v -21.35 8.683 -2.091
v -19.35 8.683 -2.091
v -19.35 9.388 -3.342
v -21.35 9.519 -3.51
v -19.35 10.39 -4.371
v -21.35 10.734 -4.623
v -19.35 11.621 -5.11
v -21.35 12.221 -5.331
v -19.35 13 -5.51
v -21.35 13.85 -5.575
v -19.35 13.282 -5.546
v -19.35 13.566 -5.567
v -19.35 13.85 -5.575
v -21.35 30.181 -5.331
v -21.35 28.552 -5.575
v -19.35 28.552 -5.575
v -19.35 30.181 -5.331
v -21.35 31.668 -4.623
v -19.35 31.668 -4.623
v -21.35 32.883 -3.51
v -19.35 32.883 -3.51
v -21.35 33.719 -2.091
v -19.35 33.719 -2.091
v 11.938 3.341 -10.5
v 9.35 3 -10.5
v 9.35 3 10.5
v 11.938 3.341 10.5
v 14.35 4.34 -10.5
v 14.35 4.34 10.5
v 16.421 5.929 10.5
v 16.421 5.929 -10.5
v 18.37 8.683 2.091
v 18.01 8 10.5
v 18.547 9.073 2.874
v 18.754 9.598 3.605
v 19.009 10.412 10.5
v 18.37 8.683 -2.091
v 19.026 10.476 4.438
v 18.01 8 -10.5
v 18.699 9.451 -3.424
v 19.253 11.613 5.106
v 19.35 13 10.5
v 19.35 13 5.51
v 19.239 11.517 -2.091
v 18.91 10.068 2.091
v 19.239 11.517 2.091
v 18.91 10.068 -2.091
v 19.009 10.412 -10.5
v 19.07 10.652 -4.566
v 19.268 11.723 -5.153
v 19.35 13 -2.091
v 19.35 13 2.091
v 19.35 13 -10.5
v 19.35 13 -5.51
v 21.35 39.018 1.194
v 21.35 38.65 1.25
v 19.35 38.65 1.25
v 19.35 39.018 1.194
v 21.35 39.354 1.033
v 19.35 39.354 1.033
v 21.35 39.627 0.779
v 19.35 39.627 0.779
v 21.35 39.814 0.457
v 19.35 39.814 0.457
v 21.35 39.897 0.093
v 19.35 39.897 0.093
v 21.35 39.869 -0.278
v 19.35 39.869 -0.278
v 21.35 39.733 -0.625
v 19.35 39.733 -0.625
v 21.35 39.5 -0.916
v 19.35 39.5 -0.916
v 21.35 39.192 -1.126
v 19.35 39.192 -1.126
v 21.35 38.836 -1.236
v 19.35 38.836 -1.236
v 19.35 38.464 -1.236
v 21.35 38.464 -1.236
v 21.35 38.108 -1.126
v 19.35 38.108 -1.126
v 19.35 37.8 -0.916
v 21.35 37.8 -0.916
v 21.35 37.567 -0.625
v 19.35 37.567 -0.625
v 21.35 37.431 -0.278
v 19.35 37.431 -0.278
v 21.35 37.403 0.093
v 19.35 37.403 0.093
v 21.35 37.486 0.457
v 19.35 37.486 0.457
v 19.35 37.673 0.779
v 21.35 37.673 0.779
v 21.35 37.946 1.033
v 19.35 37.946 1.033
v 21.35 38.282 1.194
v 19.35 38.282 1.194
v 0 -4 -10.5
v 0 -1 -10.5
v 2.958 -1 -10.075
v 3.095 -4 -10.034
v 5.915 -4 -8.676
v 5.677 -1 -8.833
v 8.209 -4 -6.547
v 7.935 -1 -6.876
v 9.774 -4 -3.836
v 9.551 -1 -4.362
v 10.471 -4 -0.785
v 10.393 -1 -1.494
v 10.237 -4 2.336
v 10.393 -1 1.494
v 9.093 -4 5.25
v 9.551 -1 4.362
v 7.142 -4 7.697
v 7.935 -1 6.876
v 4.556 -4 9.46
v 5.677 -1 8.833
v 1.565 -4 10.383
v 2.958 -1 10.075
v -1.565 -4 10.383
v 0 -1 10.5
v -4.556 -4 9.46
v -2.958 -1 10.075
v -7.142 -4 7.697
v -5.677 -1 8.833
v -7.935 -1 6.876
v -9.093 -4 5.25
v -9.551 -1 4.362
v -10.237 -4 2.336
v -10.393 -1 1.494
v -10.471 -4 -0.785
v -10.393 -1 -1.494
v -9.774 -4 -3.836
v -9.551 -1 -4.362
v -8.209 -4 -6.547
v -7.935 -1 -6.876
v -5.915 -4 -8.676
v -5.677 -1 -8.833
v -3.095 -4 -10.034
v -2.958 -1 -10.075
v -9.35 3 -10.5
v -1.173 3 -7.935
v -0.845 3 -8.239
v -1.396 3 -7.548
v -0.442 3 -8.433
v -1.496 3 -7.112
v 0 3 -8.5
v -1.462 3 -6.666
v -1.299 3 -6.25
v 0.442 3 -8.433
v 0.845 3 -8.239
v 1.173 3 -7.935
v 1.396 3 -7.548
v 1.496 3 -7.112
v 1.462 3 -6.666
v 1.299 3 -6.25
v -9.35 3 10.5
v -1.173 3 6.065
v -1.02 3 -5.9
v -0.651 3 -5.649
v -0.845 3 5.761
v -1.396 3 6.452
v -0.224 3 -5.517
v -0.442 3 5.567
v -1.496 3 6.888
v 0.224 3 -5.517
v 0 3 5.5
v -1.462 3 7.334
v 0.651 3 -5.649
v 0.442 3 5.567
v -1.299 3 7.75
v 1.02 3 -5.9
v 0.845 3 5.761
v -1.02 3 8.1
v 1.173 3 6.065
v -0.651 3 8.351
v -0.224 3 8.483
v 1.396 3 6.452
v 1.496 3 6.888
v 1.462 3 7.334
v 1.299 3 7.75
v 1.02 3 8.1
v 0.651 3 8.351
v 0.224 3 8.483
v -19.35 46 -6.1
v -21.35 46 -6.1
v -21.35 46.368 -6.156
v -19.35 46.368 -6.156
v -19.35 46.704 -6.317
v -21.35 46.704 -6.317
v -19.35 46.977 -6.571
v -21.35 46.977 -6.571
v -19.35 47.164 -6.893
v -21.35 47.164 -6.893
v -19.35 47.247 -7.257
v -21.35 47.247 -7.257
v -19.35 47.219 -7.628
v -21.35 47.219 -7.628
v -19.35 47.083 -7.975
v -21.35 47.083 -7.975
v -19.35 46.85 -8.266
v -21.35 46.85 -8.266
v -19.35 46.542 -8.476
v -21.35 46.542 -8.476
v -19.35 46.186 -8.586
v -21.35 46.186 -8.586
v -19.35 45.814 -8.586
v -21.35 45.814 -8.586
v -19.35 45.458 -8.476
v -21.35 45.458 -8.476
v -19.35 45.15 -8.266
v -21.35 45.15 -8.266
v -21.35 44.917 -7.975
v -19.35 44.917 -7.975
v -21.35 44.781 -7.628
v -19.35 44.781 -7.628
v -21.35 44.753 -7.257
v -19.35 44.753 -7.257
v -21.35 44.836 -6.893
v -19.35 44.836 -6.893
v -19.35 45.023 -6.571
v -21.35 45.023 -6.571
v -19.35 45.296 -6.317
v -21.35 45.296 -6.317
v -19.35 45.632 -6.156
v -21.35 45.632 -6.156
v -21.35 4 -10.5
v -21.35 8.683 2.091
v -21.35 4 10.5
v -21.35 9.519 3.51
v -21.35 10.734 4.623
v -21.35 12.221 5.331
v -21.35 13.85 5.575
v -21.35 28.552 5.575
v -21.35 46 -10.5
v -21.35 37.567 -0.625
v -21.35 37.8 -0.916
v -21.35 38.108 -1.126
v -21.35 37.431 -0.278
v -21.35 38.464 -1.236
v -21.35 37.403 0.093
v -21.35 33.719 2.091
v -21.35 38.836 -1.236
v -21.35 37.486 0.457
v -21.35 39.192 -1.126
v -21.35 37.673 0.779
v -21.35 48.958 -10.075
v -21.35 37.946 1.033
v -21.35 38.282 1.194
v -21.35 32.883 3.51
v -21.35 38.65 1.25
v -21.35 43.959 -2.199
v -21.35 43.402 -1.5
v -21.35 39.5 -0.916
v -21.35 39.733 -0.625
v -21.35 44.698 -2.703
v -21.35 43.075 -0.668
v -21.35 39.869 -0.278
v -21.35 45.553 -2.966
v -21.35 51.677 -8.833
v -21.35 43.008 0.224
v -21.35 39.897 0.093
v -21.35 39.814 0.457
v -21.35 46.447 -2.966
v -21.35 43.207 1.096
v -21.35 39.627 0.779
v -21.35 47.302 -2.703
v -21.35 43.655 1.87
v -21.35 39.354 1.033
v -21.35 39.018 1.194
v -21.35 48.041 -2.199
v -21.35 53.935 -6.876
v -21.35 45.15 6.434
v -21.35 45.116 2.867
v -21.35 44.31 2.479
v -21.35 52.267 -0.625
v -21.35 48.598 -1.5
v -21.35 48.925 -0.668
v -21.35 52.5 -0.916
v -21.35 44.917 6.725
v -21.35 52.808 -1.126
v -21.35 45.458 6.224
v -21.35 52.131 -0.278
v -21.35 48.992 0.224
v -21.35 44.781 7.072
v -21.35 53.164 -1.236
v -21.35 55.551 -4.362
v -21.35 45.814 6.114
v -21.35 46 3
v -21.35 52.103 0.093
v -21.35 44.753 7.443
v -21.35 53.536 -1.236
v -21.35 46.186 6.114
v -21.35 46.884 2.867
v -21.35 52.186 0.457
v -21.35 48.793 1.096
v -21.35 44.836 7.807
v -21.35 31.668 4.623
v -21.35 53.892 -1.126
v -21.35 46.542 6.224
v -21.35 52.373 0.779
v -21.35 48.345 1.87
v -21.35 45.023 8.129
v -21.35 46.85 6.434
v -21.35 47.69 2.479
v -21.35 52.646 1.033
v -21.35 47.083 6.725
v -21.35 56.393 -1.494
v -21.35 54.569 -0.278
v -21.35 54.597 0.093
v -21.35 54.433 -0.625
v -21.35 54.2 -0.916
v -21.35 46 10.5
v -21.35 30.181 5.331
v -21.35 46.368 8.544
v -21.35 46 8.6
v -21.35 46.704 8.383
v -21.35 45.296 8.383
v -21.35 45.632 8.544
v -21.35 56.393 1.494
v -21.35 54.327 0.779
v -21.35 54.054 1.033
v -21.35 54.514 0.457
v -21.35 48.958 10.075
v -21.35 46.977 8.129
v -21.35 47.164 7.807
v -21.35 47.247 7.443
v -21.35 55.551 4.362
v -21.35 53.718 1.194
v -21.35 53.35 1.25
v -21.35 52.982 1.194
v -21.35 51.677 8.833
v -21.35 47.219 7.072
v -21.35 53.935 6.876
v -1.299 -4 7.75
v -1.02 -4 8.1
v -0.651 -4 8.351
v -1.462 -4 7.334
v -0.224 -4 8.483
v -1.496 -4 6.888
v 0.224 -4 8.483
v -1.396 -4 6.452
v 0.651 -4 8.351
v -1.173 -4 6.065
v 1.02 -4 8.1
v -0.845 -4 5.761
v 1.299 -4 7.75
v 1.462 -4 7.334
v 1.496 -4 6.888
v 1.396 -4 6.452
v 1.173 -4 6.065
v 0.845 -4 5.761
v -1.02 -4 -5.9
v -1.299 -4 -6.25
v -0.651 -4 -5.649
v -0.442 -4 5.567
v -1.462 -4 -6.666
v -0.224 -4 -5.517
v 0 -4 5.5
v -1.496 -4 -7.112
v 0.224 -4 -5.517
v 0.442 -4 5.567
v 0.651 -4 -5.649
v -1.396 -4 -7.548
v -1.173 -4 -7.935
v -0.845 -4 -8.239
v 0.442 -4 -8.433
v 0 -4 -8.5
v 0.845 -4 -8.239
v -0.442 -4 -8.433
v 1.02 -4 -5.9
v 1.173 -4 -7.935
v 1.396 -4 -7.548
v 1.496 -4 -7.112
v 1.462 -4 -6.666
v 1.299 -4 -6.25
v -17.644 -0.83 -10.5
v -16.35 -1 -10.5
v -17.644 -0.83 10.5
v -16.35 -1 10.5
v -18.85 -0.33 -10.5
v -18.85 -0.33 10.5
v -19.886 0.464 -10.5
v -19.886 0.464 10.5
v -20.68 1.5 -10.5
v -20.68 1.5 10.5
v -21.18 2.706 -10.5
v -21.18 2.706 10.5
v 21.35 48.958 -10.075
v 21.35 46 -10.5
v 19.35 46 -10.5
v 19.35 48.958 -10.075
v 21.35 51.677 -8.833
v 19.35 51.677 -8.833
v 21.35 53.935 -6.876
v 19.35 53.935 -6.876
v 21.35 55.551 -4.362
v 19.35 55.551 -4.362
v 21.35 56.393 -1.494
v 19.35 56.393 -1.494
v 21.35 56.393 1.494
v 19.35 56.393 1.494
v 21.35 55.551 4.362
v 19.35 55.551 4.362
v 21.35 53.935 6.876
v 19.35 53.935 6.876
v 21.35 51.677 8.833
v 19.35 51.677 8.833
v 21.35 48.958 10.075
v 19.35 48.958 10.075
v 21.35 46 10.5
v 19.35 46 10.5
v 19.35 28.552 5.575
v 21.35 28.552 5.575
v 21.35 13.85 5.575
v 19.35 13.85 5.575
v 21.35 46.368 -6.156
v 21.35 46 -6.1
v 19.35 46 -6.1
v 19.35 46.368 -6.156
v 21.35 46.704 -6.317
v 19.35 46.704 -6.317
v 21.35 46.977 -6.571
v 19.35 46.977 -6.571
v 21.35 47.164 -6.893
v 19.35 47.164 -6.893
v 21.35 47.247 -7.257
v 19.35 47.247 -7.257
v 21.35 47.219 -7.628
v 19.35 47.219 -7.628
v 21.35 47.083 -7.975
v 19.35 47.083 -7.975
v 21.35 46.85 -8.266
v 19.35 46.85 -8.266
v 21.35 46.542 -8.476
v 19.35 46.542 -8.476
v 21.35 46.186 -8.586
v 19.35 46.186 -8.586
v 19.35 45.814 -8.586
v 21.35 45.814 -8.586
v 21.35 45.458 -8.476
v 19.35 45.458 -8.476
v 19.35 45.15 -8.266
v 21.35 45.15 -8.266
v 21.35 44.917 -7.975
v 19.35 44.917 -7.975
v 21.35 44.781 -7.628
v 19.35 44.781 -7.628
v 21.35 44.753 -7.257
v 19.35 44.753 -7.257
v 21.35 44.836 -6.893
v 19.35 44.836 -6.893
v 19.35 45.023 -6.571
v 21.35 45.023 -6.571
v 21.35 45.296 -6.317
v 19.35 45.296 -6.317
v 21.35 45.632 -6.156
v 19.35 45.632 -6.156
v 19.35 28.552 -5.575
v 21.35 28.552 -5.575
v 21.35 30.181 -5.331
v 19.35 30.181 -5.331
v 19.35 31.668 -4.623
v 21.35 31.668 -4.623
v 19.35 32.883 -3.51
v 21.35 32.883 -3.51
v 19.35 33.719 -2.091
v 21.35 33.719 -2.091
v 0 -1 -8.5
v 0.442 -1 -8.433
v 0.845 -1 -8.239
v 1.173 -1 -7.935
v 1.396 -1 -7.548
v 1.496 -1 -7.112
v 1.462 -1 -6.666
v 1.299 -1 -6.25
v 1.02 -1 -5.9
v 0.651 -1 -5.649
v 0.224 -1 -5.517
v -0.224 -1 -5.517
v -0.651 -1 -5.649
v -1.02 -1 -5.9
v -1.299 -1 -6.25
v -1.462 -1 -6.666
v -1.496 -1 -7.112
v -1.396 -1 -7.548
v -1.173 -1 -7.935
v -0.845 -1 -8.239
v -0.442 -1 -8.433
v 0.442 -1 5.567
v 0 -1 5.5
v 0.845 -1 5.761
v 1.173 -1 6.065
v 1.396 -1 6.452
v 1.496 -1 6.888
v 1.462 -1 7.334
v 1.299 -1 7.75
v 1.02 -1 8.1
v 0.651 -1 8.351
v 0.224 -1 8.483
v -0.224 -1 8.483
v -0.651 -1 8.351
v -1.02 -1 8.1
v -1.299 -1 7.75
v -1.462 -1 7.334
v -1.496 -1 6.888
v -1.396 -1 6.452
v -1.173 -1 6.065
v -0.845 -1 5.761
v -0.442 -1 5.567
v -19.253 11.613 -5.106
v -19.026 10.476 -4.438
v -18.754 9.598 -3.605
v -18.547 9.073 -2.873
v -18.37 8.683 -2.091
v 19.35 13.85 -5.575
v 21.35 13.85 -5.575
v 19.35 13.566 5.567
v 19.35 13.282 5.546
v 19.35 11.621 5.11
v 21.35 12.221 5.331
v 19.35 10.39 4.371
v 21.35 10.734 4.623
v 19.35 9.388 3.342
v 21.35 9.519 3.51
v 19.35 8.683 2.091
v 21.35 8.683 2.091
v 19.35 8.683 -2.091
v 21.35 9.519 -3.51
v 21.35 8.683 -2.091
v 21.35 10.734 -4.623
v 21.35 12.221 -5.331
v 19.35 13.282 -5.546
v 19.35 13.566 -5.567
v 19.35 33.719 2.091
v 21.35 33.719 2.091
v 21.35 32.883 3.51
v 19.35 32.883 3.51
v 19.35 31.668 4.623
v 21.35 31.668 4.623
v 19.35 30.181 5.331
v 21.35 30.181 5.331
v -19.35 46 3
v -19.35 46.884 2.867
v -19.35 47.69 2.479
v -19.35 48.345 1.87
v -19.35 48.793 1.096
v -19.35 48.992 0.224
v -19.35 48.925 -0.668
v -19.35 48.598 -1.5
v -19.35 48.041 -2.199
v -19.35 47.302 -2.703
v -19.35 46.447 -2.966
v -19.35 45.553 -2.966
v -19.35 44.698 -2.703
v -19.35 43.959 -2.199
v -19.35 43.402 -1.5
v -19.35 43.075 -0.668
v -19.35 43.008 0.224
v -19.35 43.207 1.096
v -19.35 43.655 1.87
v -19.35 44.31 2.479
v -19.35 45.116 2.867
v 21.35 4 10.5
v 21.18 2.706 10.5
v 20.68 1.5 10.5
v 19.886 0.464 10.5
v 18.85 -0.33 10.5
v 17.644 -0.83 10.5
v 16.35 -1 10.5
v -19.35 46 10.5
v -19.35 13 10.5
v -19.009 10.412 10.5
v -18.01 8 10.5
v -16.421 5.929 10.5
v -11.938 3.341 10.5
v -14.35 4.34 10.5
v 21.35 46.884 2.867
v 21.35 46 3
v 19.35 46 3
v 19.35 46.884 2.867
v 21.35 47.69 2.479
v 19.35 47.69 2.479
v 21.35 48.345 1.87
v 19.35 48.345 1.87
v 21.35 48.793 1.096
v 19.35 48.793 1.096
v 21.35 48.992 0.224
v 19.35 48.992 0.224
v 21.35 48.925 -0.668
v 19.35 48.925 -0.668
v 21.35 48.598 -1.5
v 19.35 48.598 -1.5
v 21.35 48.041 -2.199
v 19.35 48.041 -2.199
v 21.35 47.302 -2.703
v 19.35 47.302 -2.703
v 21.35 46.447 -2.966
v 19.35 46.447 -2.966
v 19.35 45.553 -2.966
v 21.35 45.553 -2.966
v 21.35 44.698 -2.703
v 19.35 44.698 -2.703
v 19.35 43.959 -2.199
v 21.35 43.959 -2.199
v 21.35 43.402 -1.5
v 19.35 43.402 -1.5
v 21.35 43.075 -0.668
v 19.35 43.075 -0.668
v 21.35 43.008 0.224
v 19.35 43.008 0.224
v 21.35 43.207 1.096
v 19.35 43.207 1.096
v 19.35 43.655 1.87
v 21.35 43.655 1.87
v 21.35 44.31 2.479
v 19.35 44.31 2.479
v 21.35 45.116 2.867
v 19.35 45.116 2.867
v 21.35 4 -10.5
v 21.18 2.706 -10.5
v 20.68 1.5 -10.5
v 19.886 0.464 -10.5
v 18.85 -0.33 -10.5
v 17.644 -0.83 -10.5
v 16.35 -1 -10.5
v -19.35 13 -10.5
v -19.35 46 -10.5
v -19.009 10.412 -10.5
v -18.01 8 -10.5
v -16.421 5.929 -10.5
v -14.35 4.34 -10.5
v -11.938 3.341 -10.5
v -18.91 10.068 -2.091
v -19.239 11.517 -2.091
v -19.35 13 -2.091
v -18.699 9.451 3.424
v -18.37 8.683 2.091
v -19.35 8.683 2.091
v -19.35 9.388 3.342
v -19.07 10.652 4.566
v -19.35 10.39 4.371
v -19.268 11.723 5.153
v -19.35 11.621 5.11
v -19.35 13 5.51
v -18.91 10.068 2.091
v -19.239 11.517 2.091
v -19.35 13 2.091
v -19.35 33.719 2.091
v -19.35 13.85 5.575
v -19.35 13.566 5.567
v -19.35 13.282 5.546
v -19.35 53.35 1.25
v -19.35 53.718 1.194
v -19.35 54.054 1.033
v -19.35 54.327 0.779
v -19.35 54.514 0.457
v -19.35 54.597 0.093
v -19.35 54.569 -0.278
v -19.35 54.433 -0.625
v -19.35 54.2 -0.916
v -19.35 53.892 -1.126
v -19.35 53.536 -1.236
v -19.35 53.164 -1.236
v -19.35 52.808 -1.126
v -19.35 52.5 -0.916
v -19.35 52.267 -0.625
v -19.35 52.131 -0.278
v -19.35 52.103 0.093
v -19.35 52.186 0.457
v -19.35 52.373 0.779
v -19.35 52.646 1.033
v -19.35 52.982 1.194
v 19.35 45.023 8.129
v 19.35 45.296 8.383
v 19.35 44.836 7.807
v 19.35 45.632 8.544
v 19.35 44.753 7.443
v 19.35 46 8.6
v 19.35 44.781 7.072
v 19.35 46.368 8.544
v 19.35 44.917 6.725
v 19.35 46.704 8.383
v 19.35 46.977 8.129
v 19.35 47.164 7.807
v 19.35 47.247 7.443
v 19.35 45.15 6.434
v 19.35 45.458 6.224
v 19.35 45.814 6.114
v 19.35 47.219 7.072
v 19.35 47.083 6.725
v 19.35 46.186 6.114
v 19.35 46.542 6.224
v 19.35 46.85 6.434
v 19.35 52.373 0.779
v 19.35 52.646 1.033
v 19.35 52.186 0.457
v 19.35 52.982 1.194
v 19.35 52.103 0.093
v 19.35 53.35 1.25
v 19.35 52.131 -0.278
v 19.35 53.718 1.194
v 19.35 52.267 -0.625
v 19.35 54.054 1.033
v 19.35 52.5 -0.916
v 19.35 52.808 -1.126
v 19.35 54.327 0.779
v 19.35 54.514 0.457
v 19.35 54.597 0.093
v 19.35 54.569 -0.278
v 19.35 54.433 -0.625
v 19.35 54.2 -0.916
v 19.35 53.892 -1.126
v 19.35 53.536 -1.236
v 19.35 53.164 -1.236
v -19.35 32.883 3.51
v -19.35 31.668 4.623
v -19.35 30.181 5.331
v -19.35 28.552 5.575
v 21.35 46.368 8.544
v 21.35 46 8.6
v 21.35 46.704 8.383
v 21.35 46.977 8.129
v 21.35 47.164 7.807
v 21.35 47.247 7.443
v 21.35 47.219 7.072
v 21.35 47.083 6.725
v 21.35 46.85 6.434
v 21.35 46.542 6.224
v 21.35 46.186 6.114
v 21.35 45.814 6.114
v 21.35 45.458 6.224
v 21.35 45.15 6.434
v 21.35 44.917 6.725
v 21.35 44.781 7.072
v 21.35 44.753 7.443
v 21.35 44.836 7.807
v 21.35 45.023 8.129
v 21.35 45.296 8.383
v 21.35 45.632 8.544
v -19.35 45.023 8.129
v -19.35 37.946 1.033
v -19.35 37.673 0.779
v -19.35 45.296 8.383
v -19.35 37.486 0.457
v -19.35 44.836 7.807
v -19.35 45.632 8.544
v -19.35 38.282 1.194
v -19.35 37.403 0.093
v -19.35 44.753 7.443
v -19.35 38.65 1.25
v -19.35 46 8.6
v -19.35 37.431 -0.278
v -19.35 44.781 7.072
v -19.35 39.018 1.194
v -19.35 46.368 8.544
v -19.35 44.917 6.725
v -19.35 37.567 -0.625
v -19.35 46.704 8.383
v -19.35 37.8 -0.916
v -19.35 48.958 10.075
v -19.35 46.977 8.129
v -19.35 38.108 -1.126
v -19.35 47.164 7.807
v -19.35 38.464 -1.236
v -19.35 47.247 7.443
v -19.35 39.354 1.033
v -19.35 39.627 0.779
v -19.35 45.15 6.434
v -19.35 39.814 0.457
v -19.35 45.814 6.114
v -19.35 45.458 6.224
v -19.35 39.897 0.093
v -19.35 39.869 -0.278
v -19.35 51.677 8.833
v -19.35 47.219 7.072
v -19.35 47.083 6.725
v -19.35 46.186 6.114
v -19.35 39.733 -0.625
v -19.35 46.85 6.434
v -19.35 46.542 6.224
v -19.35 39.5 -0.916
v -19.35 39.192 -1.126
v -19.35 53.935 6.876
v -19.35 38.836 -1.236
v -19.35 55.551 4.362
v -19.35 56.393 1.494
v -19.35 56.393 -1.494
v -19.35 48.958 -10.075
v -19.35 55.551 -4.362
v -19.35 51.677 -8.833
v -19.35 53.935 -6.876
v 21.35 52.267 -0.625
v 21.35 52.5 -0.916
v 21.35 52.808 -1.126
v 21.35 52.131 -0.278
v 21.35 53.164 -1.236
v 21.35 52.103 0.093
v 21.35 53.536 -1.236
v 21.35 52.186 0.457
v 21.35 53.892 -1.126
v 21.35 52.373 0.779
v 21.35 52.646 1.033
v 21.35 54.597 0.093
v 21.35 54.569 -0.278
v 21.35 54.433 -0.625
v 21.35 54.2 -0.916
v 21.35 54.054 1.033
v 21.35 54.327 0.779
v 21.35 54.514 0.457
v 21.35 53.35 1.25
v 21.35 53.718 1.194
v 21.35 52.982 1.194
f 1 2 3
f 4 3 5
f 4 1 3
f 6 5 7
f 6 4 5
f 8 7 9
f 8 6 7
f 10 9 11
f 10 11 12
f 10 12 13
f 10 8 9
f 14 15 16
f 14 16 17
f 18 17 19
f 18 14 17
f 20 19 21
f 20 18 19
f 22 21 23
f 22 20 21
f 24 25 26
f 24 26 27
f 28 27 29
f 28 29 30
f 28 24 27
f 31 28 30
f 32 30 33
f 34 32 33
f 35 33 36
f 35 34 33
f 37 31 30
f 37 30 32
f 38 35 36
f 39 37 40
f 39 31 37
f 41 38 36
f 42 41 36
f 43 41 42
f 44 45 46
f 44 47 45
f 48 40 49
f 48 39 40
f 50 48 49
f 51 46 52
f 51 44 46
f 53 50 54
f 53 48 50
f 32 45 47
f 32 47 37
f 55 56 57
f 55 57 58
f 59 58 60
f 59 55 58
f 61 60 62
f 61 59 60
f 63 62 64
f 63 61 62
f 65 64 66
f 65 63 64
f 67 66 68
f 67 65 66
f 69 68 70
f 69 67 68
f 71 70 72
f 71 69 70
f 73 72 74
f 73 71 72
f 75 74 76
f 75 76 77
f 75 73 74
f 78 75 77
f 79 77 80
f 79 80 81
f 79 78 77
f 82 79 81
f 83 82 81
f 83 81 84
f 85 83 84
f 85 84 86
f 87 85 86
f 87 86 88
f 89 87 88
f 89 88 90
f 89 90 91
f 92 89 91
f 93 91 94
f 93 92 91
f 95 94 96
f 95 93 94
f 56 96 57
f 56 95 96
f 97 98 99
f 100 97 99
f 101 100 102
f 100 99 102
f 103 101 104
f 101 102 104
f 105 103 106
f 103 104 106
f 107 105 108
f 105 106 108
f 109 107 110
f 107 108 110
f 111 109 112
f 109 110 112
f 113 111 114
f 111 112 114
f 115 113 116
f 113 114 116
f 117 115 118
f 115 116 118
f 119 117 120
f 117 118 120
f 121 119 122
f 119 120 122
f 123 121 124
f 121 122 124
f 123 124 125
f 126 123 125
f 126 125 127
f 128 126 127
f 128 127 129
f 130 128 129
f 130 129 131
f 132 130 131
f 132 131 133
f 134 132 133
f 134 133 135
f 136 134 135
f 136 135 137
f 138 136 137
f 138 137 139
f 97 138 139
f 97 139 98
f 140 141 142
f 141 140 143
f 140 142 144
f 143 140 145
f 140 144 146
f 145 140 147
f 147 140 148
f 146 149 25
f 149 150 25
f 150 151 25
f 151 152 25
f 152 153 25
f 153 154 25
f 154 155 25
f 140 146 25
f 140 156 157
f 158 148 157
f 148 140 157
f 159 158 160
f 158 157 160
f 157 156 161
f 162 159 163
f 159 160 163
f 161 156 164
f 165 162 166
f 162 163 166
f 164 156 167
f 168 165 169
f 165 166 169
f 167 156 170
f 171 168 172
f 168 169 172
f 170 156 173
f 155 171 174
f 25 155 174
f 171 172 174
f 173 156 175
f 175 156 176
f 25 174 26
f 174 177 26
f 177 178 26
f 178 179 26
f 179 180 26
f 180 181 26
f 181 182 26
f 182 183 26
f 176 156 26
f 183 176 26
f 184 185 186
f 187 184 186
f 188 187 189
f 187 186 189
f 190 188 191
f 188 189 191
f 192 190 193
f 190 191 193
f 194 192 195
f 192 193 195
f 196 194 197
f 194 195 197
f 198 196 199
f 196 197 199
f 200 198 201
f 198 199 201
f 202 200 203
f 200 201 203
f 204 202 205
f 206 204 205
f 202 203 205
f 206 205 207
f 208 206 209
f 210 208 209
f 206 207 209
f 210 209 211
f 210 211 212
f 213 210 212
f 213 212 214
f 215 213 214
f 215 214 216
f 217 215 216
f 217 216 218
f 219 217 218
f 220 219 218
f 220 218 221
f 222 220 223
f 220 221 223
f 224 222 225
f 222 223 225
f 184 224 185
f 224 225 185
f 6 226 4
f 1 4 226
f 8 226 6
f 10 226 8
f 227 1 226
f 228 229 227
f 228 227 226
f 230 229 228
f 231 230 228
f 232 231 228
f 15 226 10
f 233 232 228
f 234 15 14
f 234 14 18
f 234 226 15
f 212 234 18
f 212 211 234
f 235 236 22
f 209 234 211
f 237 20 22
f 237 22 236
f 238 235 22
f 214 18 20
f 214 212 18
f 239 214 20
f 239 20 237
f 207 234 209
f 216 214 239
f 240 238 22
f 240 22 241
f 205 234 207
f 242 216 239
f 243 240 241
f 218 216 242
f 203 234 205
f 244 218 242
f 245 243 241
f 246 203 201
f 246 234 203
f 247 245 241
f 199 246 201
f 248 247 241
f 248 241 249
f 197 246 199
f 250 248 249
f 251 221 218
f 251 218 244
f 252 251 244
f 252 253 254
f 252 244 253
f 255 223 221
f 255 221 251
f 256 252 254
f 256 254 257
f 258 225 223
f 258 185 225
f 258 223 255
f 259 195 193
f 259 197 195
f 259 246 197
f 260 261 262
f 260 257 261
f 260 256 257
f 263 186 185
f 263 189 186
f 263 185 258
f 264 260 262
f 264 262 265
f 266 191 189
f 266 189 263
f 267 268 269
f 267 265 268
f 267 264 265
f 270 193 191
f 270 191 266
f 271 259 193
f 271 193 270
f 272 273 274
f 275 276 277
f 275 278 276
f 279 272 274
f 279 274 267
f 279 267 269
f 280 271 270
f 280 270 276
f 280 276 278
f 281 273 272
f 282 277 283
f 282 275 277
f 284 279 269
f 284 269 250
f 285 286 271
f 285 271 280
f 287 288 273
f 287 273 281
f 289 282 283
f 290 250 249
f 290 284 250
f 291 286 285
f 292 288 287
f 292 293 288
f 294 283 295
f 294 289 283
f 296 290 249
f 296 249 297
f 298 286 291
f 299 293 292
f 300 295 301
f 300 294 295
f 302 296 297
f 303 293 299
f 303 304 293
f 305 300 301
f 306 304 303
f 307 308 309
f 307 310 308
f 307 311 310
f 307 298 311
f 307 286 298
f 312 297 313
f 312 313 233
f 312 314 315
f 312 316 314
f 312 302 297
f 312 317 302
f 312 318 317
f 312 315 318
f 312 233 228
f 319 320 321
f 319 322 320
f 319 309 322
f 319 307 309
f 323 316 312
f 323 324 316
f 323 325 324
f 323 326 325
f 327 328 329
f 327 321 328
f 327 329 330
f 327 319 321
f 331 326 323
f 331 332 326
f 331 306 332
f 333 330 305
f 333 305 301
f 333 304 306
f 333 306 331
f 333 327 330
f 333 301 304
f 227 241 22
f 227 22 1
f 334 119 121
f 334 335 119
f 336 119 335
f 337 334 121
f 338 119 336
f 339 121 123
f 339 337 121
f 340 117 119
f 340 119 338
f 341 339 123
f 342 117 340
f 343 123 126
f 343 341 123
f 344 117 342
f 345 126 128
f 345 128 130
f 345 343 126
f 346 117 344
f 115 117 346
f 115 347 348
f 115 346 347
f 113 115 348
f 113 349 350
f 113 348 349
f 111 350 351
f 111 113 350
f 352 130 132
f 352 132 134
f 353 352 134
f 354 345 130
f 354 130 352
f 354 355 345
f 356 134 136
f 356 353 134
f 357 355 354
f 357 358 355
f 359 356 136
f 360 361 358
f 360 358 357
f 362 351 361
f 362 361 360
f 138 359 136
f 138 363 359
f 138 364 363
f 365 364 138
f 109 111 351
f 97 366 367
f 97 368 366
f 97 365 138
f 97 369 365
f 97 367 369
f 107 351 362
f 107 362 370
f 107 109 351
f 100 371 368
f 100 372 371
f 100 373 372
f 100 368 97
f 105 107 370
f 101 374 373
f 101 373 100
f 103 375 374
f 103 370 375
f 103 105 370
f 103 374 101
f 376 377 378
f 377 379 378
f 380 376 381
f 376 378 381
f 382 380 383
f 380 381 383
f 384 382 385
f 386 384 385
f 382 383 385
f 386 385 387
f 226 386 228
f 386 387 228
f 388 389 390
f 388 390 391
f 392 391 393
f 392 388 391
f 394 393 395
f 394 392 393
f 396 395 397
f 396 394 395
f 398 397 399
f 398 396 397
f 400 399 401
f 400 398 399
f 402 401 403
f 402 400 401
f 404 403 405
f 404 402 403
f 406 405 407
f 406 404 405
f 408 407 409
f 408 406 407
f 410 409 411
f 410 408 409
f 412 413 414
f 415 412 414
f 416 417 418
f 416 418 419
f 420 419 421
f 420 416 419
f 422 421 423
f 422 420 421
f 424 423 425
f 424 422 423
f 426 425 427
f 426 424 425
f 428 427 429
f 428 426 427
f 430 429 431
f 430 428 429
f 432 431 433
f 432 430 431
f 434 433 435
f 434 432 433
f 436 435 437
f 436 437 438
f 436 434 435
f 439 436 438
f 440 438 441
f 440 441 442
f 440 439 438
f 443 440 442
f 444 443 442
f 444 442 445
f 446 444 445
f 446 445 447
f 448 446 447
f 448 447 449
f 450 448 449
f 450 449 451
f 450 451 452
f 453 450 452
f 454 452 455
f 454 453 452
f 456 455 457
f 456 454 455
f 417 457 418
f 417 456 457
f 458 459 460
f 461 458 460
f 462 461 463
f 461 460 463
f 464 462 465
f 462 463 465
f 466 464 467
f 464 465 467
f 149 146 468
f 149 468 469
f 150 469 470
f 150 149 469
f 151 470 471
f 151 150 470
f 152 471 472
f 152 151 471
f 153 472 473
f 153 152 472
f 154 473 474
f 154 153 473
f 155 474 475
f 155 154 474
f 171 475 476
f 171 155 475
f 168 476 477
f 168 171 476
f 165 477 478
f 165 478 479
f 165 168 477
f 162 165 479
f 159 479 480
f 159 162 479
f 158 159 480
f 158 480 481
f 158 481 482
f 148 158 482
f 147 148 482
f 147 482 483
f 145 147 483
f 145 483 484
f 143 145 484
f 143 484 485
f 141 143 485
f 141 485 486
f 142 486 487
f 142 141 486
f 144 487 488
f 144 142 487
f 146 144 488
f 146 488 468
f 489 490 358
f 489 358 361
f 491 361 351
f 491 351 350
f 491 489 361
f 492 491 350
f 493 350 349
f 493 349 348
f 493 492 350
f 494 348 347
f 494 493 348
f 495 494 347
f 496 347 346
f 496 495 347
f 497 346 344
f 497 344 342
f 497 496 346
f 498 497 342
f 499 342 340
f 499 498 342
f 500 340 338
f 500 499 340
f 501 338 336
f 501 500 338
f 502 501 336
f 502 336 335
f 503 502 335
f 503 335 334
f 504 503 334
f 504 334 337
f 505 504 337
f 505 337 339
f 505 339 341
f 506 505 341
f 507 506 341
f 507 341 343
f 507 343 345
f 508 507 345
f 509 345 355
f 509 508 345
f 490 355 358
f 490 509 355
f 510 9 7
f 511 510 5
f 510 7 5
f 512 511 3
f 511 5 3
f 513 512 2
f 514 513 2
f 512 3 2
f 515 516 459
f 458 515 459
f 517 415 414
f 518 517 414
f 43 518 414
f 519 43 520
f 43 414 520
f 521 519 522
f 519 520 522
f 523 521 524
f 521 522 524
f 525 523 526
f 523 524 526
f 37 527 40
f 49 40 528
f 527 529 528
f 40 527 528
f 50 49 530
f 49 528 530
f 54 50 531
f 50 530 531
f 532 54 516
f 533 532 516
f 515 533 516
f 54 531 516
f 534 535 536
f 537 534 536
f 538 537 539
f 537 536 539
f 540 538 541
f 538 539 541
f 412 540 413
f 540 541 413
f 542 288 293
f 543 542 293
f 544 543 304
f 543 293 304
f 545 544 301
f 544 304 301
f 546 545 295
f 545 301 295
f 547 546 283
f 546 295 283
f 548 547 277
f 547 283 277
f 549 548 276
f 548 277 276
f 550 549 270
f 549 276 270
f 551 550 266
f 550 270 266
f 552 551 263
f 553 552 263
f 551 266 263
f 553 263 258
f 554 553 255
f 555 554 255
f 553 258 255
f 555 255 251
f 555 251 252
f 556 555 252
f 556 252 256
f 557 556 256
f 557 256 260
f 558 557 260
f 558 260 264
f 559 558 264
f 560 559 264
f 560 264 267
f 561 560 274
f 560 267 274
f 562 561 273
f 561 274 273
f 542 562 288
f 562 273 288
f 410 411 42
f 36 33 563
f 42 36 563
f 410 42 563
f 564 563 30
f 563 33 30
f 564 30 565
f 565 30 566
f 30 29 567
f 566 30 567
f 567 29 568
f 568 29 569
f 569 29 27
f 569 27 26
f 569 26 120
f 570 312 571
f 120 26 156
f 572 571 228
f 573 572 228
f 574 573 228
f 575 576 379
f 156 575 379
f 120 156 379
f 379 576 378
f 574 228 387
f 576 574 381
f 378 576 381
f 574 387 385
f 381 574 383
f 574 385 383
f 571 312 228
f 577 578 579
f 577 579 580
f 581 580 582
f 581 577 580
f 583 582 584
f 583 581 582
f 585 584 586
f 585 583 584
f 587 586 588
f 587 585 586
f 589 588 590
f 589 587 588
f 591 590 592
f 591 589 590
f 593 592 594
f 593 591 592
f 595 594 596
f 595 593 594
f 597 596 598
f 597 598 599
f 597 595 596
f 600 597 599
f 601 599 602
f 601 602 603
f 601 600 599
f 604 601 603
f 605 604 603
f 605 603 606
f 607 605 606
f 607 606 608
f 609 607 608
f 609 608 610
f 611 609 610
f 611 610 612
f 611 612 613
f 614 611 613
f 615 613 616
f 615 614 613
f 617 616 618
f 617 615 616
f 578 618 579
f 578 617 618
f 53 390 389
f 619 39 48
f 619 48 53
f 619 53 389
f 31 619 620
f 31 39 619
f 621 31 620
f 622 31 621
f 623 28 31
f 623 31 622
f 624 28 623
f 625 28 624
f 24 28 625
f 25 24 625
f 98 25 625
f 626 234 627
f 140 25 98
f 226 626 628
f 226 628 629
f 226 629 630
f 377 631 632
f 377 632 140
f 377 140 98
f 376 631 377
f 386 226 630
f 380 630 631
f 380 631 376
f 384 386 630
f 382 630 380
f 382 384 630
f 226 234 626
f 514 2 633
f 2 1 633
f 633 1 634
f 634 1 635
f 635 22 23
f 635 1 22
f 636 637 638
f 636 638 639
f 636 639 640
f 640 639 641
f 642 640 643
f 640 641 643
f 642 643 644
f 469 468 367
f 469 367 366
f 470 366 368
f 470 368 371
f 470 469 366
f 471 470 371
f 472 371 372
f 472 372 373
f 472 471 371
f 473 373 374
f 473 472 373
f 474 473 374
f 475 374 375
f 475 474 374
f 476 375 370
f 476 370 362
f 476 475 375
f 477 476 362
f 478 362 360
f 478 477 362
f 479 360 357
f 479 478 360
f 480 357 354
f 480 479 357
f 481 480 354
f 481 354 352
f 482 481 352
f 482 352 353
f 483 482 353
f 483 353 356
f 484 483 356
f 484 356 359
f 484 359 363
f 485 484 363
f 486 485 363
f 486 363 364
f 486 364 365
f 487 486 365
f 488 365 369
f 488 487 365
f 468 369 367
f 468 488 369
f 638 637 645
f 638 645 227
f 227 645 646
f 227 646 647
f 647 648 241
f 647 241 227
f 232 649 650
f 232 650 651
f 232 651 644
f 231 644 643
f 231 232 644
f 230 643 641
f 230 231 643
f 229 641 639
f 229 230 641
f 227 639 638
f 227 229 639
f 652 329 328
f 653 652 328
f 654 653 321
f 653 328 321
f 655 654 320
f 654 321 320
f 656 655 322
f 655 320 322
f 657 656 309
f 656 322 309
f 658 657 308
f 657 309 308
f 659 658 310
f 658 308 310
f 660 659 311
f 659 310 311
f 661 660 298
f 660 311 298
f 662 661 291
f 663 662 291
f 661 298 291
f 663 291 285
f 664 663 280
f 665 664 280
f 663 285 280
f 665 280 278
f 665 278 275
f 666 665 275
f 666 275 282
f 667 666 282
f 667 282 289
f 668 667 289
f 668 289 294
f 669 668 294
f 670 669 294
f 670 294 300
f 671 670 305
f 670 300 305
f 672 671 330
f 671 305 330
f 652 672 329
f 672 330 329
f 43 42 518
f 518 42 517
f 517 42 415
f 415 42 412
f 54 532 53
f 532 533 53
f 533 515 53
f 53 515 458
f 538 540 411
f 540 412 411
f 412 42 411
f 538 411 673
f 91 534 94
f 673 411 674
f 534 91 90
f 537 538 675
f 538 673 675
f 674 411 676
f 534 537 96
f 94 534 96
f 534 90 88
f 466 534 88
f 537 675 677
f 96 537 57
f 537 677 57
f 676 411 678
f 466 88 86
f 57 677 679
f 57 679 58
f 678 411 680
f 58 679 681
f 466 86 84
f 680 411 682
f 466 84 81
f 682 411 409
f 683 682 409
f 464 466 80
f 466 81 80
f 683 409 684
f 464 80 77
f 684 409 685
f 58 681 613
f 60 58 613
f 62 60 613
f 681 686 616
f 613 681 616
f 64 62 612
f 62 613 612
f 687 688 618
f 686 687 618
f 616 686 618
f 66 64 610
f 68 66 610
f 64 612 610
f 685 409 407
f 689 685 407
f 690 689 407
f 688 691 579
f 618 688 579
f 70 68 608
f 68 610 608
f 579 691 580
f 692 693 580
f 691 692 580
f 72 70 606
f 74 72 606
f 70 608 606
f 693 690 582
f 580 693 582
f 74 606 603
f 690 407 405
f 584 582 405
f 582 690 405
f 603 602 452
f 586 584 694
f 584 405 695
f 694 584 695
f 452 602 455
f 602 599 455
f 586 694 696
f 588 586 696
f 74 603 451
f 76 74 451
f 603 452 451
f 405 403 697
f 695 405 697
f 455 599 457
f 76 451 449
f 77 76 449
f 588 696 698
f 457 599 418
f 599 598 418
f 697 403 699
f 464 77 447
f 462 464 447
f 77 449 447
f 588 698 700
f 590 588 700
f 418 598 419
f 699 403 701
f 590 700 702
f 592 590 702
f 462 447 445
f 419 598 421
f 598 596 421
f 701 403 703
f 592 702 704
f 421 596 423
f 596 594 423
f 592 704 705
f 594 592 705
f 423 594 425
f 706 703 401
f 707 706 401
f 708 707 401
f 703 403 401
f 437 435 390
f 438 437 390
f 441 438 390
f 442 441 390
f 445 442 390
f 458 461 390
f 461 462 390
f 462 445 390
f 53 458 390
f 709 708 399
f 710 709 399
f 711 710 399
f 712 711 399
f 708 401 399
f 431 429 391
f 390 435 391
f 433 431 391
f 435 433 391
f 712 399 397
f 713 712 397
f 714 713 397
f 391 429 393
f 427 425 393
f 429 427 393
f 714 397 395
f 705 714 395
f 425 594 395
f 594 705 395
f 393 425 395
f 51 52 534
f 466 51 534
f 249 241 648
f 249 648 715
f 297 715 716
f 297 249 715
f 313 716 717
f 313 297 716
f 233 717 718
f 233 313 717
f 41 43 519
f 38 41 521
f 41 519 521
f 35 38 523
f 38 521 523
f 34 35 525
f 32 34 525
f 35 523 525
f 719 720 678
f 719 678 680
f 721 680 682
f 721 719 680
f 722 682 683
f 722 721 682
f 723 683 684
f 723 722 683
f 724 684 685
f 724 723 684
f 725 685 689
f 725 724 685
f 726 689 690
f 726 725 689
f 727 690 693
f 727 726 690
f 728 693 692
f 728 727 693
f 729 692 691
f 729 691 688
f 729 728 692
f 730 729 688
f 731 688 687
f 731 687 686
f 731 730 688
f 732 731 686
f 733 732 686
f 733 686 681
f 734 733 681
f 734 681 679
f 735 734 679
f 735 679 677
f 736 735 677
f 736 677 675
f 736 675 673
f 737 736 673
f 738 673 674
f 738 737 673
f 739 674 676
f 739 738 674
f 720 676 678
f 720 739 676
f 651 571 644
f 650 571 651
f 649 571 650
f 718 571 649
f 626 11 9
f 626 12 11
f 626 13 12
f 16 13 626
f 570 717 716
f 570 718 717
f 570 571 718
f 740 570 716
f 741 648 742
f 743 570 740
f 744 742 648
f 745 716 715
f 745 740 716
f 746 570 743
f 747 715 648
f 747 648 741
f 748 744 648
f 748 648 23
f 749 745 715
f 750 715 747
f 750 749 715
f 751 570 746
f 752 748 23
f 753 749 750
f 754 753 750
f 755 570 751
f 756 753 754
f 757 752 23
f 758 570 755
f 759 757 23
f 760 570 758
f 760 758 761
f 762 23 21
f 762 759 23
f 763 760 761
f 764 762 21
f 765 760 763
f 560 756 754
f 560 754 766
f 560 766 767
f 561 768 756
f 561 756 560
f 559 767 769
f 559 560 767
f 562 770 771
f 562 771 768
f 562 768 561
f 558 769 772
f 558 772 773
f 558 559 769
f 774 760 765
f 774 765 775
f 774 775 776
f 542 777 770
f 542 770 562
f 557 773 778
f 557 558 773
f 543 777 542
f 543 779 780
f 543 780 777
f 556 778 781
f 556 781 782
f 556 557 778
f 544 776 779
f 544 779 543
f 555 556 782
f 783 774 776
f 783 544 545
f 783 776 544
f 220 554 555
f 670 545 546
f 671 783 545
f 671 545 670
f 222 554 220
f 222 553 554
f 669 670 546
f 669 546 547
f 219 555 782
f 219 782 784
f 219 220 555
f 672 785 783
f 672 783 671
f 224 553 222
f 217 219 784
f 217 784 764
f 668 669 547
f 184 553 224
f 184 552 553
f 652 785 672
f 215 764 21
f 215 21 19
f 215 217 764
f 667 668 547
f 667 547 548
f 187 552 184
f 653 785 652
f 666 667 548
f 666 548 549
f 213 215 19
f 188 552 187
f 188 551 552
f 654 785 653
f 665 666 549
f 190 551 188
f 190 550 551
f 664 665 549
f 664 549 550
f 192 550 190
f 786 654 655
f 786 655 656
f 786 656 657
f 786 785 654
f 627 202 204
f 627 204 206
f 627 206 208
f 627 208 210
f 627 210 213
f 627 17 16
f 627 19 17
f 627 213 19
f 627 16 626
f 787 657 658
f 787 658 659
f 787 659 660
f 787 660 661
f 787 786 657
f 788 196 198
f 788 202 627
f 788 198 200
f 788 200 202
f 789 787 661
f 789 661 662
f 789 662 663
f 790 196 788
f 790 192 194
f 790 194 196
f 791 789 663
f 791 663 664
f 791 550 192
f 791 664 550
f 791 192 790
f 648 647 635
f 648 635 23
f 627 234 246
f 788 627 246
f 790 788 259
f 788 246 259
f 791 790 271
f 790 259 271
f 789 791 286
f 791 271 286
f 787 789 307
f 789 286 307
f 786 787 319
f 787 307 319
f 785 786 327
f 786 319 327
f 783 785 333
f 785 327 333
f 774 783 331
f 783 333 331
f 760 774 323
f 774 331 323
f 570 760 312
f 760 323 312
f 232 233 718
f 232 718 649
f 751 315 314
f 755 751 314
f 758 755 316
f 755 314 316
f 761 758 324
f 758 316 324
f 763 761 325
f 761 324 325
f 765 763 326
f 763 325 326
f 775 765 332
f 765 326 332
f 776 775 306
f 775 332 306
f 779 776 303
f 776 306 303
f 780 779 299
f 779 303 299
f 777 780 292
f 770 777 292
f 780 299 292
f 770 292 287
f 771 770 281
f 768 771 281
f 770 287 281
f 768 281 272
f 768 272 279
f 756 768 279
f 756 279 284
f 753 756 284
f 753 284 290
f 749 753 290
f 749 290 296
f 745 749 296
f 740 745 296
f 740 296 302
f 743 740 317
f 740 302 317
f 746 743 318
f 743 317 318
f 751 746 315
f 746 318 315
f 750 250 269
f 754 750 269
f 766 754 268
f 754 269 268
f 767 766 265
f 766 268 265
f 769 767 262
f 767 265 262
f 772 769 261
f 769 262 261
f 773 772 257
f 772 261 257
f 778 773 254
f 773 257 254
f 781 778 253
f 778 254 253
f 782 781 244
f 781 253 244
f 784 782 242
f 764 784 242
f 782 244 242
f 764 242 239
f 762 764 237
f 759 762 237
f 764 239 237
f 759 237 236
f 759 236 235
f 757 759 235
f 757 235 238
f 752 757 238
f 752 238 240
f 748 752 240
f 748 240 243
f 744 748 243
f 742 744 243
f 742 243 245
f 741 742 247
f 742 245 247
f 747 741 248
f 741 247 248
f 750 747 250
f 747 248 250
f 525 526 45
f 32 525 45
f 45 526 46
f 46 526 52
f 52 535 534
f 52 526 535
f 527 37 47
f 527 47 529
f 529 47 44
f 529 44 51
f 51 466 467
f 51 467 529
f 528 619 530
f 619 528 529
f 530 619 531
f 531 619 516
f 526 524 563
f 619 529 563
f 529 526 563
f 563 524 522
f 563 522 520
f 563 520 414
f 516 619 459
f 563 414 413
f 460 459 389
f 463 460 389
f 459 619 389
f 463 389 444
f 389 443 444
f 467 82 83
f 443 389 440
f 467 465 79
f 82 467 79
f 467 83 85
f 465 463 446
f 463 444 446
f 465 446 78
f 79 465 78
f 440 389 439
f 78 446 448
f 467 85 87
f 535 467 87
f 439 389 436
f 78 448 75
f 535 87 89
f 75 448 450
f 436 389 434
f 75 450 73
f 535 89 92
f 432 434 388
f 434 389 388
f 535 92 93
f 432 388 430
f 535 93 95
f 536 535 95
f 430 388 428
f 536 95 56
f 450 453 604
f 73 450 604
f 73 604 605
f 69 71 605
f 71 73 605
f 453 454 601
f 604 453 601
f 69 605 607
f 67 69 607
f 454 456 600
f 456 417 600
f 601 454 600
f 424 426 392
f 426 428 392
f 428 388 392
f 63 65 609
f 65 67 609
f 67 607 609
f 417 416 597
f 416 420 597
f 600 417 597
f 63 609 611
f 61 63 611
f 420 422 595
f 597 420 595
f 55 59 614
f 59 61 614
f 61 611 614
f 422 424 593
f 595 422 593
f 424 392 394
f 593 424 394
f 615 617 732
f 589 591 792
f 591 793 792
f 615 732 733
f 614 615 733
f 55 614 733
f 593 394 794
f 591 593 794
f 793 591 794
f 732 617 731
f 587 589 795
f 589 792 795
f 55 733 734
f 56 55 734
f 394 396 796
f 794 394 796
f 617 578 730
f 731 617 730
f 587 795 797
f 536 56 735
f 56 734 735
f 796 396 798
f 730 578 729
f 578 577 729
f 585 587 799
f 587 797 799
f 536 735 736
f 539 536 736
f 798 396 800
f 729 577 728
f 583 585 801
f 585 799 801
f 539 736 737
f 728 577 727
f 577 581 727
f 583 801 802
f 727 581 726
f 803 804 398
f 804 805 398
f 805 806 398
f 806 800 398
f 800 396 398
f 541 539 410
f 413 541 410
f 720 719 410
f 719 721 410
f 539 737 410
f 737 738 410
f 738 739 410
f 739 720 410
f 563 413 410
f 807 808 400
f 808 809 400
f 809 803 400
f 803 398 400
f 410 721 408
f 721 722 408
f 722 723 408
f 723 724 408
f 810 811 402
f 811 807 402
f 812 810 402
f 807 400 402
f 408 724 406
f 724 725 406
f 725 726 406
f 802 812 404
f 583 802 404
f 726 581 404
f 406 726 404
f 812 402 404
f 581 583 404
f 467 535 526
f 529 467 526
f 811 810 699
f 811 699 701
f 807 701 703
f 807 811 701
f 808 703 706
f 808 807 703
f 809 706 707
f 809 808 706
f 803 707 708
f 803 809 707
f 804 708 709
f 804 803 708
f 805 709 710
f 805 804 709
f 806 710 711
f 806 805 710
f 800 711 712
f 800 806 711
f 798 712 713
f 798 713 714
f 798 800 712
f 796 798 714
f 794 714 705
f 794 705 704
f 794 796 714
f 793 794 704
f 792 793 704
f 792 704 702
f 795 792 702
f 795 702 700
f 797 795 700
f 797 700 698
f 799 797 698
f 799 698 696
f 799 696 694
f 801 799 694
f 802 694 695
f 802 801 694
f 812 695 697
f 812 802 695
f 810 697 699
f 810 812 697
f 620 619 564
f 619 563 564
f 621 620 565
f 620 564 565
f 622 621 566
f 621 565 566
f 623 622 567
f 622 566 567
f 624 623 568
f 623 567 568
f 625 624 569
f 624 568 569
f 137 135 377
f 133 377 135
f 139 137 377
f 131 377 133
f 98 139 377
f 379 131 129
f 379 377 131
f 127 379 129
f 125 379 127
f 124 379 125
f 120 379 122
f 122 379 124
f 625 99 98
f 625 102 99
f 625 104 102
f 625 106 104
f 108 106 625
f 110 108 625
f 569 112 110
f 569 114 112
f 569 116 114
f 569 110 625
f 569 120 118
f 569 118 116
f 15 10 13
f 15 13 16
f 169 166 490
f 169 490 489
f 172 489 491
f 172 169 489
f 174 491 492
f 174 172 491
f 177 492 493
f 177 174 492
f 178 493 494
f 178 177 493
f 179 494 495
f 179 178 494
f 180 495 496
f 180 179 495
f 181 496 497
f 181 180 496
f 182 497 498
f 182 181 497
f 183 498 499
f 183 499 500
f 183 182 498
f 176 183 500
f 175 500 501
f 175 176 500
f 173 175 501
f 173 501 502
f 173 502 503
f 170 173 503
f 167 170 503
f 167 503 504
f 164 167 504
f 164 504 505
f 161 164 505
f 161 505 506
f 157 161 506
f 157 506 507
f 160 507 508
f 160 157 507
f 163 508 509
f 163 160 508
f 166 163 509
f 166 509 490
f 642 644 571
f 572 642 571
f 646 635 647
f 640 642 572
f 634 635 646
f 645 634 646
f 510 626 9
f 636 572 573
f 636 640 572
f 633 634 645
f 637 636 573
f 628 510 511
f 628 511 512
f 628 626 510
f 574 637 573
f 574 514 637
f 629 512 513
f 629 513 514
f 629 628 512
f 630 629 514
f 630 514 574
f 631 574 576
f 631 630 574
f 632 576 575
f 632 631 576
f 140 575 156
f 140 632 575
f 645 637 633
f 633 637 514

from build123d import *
from build123d.topology import SkipClean

# Parameters (mm, degrees)
SKETCH_1_W           = 42.7
SKETCH_1_H           = 21
SKETCH_1_R           = 1.5
EXTRUDE_1_DEPTH      = 2
SKETCH_2_R           = 1.25
SKETCH_2_R_2         = 3
EXTRUDE_2_DEPTH      = 2
EXTRUDE_3_DEPTH      = 1
EXTRUDE_3_DEPTH_BACK = 3
SKETCH_3_W           = 42.7
SKETCH_3_H           = 21
SKETCH_4_R           = 10.5
SKETCH_4_R_2         = 1.5
EXTRUDE_4_DEPTH      = 3
FILLET_1_R           = 10
FILLET_2_R           = 5
CUT_EXTRUDE_START    = -4
SKETCH_6_R           = 1.5
CUT_EXTRUDE_1_DEPTH  = 4


with BuildPart() as part:
    # 草图1 → 凸台-拉伸1 (new body)
    with BuildSketch(Plane(origin=(0, 0, 0), x_dir=(1, 0, 0), z_dir=(0, 1, 0))):
        Rectangle(SKETCH_1_W, SKETCH_1_H)
        with Locations(Location((7.5, 5, 0), (0, 0, 270))):
            Circle(SKETCH_1_R, mode=Mode.SUBTRACT)
        with Locations(Location((7.5, -5, 0), (0, 0, 90))):
            Circle(SKETCH_1_R, mode=Mode.SUBTRACT)
        with Locations(Location((-7.5, -5, 0), (0, 0, 270))):
            Circle(SKETCH_1_R, mode=Mode.SUBTRACT)
        with Locations(Location((-7.5, 5, 0), (0, 0, 90))):
            Circle(SKETCH_1_R, mode=Mode.SUBTRACT)
        with BuildLine():
            Line((8.017950723, 1.550908082), (12.912587519, 1.550908082))
            ThreePointArc((12.912587519, 1.550908082), (14.126270768, 1.145131224), (14.697546856, 0))
            ThreePointArc((14.697546856, 0), (14.126270768, -1.145131224), (12.912587519, -1.550908082))
            Line((12.912587519, -1.550908082), (8.017950723, -1.550908082))
            add(Edge.make_bspline(
                [(0, -7.407271614), (2.092471107, -7.358009404), (3.043739342, -2.951912586), (6.007732496, -1.626733157), (8.017950723, -1.550908082)],
                knots=[0, 0, 0, 0, 0.496822763, 1, 1, 1, 1], degree=3))
            add(Edge.make_bspline(
                [(0, -7.407271614), (-2.092471107, -7.358009404), (-3.043739342, -2.951912586), (-6.007732496, -1.626733157), (-8.017950723, -1.550908082)],
                knots=[0, 0, 0, 0, 0.496822763, 1, 1, 1, 1], degree=3))
            Line((-8.017950723, -1.550908082), (-12.912587519, -1.550908082))
            ThreePointArc((-12.912587519, -1.550908082), (-14.126270768, -1.145131224), (-14.697546856, 0))
            ThreePointArc((-14.697546856, 0), (-14.126270768, 1.145131224), (-12.912587519, 1.550908082))
            Line((-12.912587519, 1.550908082), (-8.017950723, 1.550908082))
            add(Edge.make_bspline(
                [(0, 7.407271614), (-2.092471107, 7.358009404), (-3.043739342, 2.951912586), (-6.007732496, 1.626733157), (-8.017950723, 1.550908082)],
                knots=[0, 0, 0, 0, 0.496822763, 1, 1, 1, 1], degree=3))
            add(Edge.make_bspline(
                [(0, 7.407271614), (2.092471107, 7.358009404), (3.043739342, 2.951912586), (6.007732496, 1.626733157), (8.017950723, 1.550908082)],
                knots=[0, 0, 0, 0, 0.496822763, 1, 1, 1, 1], degree=3))
        make_face(mode=Mode.SUBTRACT)
    extrude(amount=EXTRUDE_1_DEPTH)

    # 草图2 → 凸台-拉伸2 (add)
    with BuildSketch(Plane.ZY.offset(21.35)):
        with BuildLine():
            Line((-10.5, 2), (-10.5, 46))
            ThreePointArc((-10.5, 46), (0, 56.5), (10.5, 46))
            Line((10.5, 46), (10.5, 2))
            Line((10.5, 2), (-10.5, 2))
        make_face()
        with Locations((0, 38.65)):
            Circle(SKETCH_2_R, mode=Mode.SUBTRACT)
        with Locations((-7.35, 46)):
            Circle(SKETCH_2_R, mode=Mode.SUBTRACT)
        with Locations((0, 53.35)):
            Circle(SKETCH_2_R, mode=Mode.SUBTRACT)
        with Locations((7.35, 46)):
            Circle(SKETCH_2_R, mode=Mode.SUBTRACT)
        with Locations((0, 46)):
            Circle(SKETCH_2_R_2, mode=Mode.SUBTRACT)
        with BuildLine():
            Line((-2.091438456, 33.71946821), (-2.091438456, 8.682620376))
            ThreePointArc((-2.091438456, 8.682620376), (-4.622608783, 10.734209017), (-5.574745456, 13.850179963))
            Line((-5.574745456, 13.850179963), (-5.574745456, 28.551908623))
            ThreePointArc((-5.574745456, 28.551908623), (-4.622608783, 31.667879569), (-2.091438456, 33.71946821))
        make_face(mode=Mode.SUBTRACT)
        with BuildLine():
            Line((5.574745456, 28.551908623), (5.574745456, 13.850179963))
            ThreePointArc((5.574745456, 13.850179963), (4.622608783, 10.734209017), (2.091438456, 8.682620376))
            Line((2.091438456, 8.682620376), (2.091438456, 33.71946821))
            ThreePointArc((2.091438456, 33.71946821), (4.622608783, 31.667879569), (5.574745456, 28.551908623))
        make_face(mode=Mode.SUBTRACT)
    extrude_2 = extrude(amount=-EXTRUDE_2_DEPTH)

    # 镜向1: 凸台-拉伸2 across plane
    add(extrude_2.mirror(Plane(origin=(0, 0, 0), x_dir=(0, 0, 1), z_dir=(1, 0, 0))))

    # 草图3 → 凸台-拉伸3 (add, two sides: drawn at the far end of the back side and taken through both)
    with BuildSketch(Plane.XZ.offset(-EXTRUDE_3_DEPTH_BACK)):
        Rectangle(SKETCH_3_W, SKETCH_3_H)
    extrude(amount=EXTRUDE_3_DEPTH + EXTRUDE_3_DEPTH_BACK)

    # 草图4 → 凸台-拉伸4 (add)
    with BuildSketch(Plane.XZ.offset(1)):
        with Locations(Location((0, 0, 0), (0, 0, 270))):
            Circle(SKETCH_4_R)
        with Locations(Location((0, 7, 0), (0, 0, 270))):
            Circle(SKETCH_4_R_2, mode=Mode.SUBTRACT)
        with Locations(Location((0, -7, 0), (0, 0, 270))):
            Circle(SKETCH_4_R_2, mode=Mode.SUBTRACT)
    extrude(amount=EXTRUDE_4_DEPTH)

    # 圆角1
    # the kernel refuses this fillet: 10 mm, written as the material it adds along each edge
    with BuildSketch(Plane(origin=(19.35, 3, -10.5), x_dir=(-1, 0, 0), z_dir=(0, 0, 1))) as fillet_1_piece_1_section:
        with BuildLine():
            CenterArc((FILLET_1_R, -FILLET_1_R), FILLET_1_R, 90, 90)
            Line((0, -FILLET_1_R), (0, 0))
            Line((0, 0), (FILLET_1_R, 0))
        make_face()
    fillet_1_piece_1 = extrude(amount=21, mode=Mode.PRIVATE)
    fillet_1_piece_1 = fillet_1_piece_1 - Plane(origin=(17.043313865, 13.850179963, 0), x_dir=(0, 0, 1), z_dir=(1, 0, 0)) * Cylinder(5.574745456, 82, mode=Mode.PRIVATE)
    fillet_1_piece_1 = split(fillet_1_piece_1, bisect_by=Plane(origin=(17.043313865, 5.15733044, -2.091438456), z_dir=(0, 0, -1)), keep=Keep.TOP, mode=Mode.PRIVATE)
    add(fillet_1_piece_1)
    with BuildSketch(Plane(origin=(19.35, 3, -10.5), x_dir=(-1, 0, 0), z_dir=(0, 0, 1))) as fillet_1_piece_2_section:
        with BuildLine():
            CenterArc((FILLET_1_R, -FILLET_1_R), FILLET_1_R, 90, 90)
            Line((0, -FILLET_1_R), (0, 0))
            Line((0, 0), (FILLET_1_R, 0))
        make_face()
    fillet_1_piece_2 = extrude(amount=21, mode=Mode.PRIVATE)
    fillet_1_piece_2 = split(fillet_1_piece_2, bisect_by=Plane(origin=(16.850424397, 4.734237848, 2.091438456), z_dir=(0, 0, -1)), keep=Keep.TOP, mode=Mode.PRIVATE)
    fillet_1_piece_2 = fillet_1_piece_2 - Plane(origin=(16.850424397, 13.850179963, 0), x_dir=(0, 0, 1), z_dir=(1, 0, 0)) * Cylinder(5.574745456, 82, mode=Mode.PRIVATE)
    fillet_1_piece_2 = split(fillet_1_piece_2, bisect_by=Plane(origin=(16.850424397, 4.734237848, -2.091438456), z_dir=(0, 0, 1)), keep=Keep.TOP, mode=Mode.PRIVATE)
    add(fillet_1_piece_2)
    with BuildSketch(Plane(origin=(19.35, 3, -10.5), x_dir=(-1, 0, 0), z_dir=(0, 0, 1))) as fillet_1_piece_3_section:
        with BuildLine():
            CenterArc((FILLET_1_R, -FILLET_1_R), FILLET_1_R, 90, 90)
            Line((0, -FILLET_1_R), (0, 0))
            Line((0, 0), (FILLET_1_R, 0))
        make_face()
    fillet_1_piece_3 = extrude(amount=21, mode=Mode.PRIVATE)
    fillet_1_piece_3 = split(fillet_1_piece_3, bisect_by=Plane(origin=(19.170455524, 9.949953682, 2.091438456), z_dir=(0, 0, -1)), keep=Keep.TOP, mode=Mode.PRIVATE)
    fillet_1_piece_3 = fillet_1_piece_3 & Plane(origin=(19.170455524, 13.850179963, 0), x_dir=(0, 0, 1), z_dir=(1, 0, 0)) * Cylinder(5.574745456, 82, mode=Mode.PRIVATE)
    fillet_1_piece_3 = split(fillet_1_piece_3, bisect_by=Plane(origin=(19.170455524, 9.949953682, -2.091438456), z_dir=(0, 0, 1)), keep=Keep.TOP, mode=Mode.PRIVATE)
    add(fillet_1_piece_3)
    with BuildSketch(Plane(origin=(19.35, 3, -10.5), x_dir=(-1, 0, 0), z_dir=(0, 0, 1))) as fillet_1_piece_4_section:
        with BuildLine():
            CenterArc((FILLET_1_R, -FILLET_1_R), FILLET_1_R, 90, 90)
            Line((0, -FILLET_1_R), (0, 0))
            Line((0, 0), (FILLET_1_R, 0))
        make_face()
    fillet_1_piece_4 = extrude(amount=21, mode=Mode.PRIVATE)
    fillet_1_piece_4 = split(fillet_1_piece_4, bisect_by=Plane(origin=(17.043313289, 5.157330644, 2.091438456), z_dir=(0, 0, 1)), keep=Keep.TOP, mode=Mode.PRIVATE)
    fillet_1_piece_4 = fillet_1_piece_4 - Plane(origin=(17.043313289, 13.850179963, 0), x_dir=(0, 0, 1), z_dir=(1, 0, 0)) * Cylinder(5.574745456, 82, mode=Mode.PRIVATE)
    add(fillet_1_piece_4)
    with BuildSketch(Plane(origin=(-19.35, 3, -10.5), x_dir=(0, 1, 0), z_dir=(0, 0, 1))) as fillet_1_piece_5_section:
        with BuildLine():
            CenterArc((FILLET_1_R, -FILLET_1_R), FILLET_1_R, 90, 90)
            Line((0, -FILLET_1_R), (0, 0))
            Line((0, 0), (FILLET_1_R, 0))
        make_face()
    fillet_1_piece_5 = extrude(amount=21, mode=Mode.PRIVATE)
    fillet_1_piece_5 = fillet_1_piece_5 - Plane(origin=(-17.043313718, 13.850179963, 0), x_dir=(0, 0, 1), z_dir=(-1, 0, 0)) * Cylinder(5.574745456, 82, mode=Mode.PRIVATE)
    fillet_1_piece_5 = split(fillet_1_piece_5, bisect_by=Plane(origin=(-17.043313718, 5.157330569, -2.091438456), z_dir=(0, 0, -1)), keep=Keep.TOP, mode=Mode.PRIVATE)
    add(fillet_1_piece_5)
    with BuildSketch(Plane(origin=(-19.35, 3, -10.5), x_dir=(0, 1, 0), z_dir=(0, 0, 1))) as fillet_1_piece_6_section:
        with BuildLine():
            CenterArc((FILLET_1_R, -FILLET_1_R), FILLET_1_R, 90, 90)
            Line((0, -FILLET_1_R), (0, 0))
            Line((0, 0), (FILLET_1_R, 0))
        make_face()
    fillet_1_piece_6 = extrude(amount=21, mode=Mode.PRIVATE)
    fillet_1_piece_6 = split(fillet_1_piece_6, bisect_by=Plane(origin=(-16.850424159, 4.734237852, 2.091438456), z_dir=(0, 0, -1)), keep=Keep.TOP, mode=Mode.PRIVATE)
    fillet_1_piece_6 = fillet_1_piece_6 - Plane(origin=(-16.850424159, 13.850179963, 0), x_dir=(0, 0, 1), z_dir=(-1, 0, 0)) * Cylinder(5.574745456, 82, mode=Mode.PRIVATE)
    fillet_1_piece_6 = split(fillet_1_piece_6, bisect_by=Plane(origin=(-16.850424159, 4.734237852, -2.091438456), z_dir=(0, 0, 1)), keep=Keep.TOP, mode=Mode.PRIVATE)
    add(fillet_1_piece_6)
    with BuildSketch(Plane(origin=(-19.35, 3, -10.5), x_dir=(0, 1, 0), z_dir=(0, 0, 1))) as fillet_1_piece_7_section:
        with BuildLine():
            CenterArc((FILLET_1_R, -FILLET_1_R), FILLET_1_R, 90, 90)
            Line((0, -FILLET_1_R), (0, 0))
            Line((0, 0), (FILLET_1_R, 0))
        make_face()
    fillet_1_piece_7 = extrude(amount=21, mode=Mode.PRIVATE)
    fillet_1_piece_7 = split(fillet_1_piece_7, bisect_by=Plane(origin=(-17.043313652, 5.157330325, 2.091438456), z_dir=(0, 0, 1)), keep=Keep.TOP, mode=Mode.PRIVATE)
    fillet_1_piece_7 = fillet_1_piece_7 - Plane(origin=(-17.043313652, 13.850179963, 0), x_dir=(0, 0, 1), z_dir=(-1, 0, 0)) * Cylinder(5.574745456, 82, mode=Mode.PRIVATE)
    add(fillet_1_piece_7)
    with BuildSketch(Plane(origin=(-19.35, 3, -10.5), x_dir=(0, 1, 0), z_dir=(0, 0, 1))) as fillet_1_piece_8_section:
        with BuildLine():
            CenterArc((FILLET_1_R, -FILLET_1_R), FILLET_1_R, 90, 90)
            Line((0, -FILLET_1_R), (0, 0))
            Line((0, 0), (FILLET_1_R, 0))
        make_face()
    fillet_1_piece_8 = extrude(amount=21, mode=Mode.PRIVATE)
    fillet_1_piece_8 = split(fillet_1_piece_8, bisect_by=Plane(origin=(-19.170455532, 9.949953694, 2.091438456), z_dir=(0, 0, -1)), keep=Keep.TOP, mode=Mode.PRIVATE)
    fillet_1_piece_8 = fillet_1_piece_8 & Plane(origin=(-19.170455532, 13.850179963, 0), x_dir=(0, 0, 1), z_dir=(-1, 0, 0)) * Cylinder(5.574745456, 82, mode=Mode.PRIVATE)
    fillet_1_piece_8 = split(fillet_1_piece_8, bisect_by=Plane(origin=(-19.170455532, 9.949953694, -2.091438456), z_dir=(0, 0, 1)), keep=Keep.TOP, mode=Mode.PRIVATE)
    add(fillet_1_piece_8)

    # 圆角2
    fillet_2_edges = [part.edges().sort_by_distance(p)[0] for p in [
        (-21.35, -1, 0),
        (21.35, -1, 0),
    ]]
    fillet(fillet_2_edges, radius=FILLET_2_R)

    # 草图6 → 切除-拉伸1 (cut)
    with SkipClean():  # the faces are left unmerged after this step: merging them gives an invalid solid
        with BuildSketch(Plane.XZ.offset(1).offset(CUT_EXTRUDE_START)):
            with Locations(Location((0, 7, 0), (0, 0, 270))):
                Circle(SKETCH_6_R)
            with Locations(Location((0, -7, 0), (0, 0, 270))):
                Circle(SKETCH_6_R)
        extrude(amount=CUT_EXTRUDE_1_DEPTH, mode=Mode.SUBTRACT)


solid = part.part
